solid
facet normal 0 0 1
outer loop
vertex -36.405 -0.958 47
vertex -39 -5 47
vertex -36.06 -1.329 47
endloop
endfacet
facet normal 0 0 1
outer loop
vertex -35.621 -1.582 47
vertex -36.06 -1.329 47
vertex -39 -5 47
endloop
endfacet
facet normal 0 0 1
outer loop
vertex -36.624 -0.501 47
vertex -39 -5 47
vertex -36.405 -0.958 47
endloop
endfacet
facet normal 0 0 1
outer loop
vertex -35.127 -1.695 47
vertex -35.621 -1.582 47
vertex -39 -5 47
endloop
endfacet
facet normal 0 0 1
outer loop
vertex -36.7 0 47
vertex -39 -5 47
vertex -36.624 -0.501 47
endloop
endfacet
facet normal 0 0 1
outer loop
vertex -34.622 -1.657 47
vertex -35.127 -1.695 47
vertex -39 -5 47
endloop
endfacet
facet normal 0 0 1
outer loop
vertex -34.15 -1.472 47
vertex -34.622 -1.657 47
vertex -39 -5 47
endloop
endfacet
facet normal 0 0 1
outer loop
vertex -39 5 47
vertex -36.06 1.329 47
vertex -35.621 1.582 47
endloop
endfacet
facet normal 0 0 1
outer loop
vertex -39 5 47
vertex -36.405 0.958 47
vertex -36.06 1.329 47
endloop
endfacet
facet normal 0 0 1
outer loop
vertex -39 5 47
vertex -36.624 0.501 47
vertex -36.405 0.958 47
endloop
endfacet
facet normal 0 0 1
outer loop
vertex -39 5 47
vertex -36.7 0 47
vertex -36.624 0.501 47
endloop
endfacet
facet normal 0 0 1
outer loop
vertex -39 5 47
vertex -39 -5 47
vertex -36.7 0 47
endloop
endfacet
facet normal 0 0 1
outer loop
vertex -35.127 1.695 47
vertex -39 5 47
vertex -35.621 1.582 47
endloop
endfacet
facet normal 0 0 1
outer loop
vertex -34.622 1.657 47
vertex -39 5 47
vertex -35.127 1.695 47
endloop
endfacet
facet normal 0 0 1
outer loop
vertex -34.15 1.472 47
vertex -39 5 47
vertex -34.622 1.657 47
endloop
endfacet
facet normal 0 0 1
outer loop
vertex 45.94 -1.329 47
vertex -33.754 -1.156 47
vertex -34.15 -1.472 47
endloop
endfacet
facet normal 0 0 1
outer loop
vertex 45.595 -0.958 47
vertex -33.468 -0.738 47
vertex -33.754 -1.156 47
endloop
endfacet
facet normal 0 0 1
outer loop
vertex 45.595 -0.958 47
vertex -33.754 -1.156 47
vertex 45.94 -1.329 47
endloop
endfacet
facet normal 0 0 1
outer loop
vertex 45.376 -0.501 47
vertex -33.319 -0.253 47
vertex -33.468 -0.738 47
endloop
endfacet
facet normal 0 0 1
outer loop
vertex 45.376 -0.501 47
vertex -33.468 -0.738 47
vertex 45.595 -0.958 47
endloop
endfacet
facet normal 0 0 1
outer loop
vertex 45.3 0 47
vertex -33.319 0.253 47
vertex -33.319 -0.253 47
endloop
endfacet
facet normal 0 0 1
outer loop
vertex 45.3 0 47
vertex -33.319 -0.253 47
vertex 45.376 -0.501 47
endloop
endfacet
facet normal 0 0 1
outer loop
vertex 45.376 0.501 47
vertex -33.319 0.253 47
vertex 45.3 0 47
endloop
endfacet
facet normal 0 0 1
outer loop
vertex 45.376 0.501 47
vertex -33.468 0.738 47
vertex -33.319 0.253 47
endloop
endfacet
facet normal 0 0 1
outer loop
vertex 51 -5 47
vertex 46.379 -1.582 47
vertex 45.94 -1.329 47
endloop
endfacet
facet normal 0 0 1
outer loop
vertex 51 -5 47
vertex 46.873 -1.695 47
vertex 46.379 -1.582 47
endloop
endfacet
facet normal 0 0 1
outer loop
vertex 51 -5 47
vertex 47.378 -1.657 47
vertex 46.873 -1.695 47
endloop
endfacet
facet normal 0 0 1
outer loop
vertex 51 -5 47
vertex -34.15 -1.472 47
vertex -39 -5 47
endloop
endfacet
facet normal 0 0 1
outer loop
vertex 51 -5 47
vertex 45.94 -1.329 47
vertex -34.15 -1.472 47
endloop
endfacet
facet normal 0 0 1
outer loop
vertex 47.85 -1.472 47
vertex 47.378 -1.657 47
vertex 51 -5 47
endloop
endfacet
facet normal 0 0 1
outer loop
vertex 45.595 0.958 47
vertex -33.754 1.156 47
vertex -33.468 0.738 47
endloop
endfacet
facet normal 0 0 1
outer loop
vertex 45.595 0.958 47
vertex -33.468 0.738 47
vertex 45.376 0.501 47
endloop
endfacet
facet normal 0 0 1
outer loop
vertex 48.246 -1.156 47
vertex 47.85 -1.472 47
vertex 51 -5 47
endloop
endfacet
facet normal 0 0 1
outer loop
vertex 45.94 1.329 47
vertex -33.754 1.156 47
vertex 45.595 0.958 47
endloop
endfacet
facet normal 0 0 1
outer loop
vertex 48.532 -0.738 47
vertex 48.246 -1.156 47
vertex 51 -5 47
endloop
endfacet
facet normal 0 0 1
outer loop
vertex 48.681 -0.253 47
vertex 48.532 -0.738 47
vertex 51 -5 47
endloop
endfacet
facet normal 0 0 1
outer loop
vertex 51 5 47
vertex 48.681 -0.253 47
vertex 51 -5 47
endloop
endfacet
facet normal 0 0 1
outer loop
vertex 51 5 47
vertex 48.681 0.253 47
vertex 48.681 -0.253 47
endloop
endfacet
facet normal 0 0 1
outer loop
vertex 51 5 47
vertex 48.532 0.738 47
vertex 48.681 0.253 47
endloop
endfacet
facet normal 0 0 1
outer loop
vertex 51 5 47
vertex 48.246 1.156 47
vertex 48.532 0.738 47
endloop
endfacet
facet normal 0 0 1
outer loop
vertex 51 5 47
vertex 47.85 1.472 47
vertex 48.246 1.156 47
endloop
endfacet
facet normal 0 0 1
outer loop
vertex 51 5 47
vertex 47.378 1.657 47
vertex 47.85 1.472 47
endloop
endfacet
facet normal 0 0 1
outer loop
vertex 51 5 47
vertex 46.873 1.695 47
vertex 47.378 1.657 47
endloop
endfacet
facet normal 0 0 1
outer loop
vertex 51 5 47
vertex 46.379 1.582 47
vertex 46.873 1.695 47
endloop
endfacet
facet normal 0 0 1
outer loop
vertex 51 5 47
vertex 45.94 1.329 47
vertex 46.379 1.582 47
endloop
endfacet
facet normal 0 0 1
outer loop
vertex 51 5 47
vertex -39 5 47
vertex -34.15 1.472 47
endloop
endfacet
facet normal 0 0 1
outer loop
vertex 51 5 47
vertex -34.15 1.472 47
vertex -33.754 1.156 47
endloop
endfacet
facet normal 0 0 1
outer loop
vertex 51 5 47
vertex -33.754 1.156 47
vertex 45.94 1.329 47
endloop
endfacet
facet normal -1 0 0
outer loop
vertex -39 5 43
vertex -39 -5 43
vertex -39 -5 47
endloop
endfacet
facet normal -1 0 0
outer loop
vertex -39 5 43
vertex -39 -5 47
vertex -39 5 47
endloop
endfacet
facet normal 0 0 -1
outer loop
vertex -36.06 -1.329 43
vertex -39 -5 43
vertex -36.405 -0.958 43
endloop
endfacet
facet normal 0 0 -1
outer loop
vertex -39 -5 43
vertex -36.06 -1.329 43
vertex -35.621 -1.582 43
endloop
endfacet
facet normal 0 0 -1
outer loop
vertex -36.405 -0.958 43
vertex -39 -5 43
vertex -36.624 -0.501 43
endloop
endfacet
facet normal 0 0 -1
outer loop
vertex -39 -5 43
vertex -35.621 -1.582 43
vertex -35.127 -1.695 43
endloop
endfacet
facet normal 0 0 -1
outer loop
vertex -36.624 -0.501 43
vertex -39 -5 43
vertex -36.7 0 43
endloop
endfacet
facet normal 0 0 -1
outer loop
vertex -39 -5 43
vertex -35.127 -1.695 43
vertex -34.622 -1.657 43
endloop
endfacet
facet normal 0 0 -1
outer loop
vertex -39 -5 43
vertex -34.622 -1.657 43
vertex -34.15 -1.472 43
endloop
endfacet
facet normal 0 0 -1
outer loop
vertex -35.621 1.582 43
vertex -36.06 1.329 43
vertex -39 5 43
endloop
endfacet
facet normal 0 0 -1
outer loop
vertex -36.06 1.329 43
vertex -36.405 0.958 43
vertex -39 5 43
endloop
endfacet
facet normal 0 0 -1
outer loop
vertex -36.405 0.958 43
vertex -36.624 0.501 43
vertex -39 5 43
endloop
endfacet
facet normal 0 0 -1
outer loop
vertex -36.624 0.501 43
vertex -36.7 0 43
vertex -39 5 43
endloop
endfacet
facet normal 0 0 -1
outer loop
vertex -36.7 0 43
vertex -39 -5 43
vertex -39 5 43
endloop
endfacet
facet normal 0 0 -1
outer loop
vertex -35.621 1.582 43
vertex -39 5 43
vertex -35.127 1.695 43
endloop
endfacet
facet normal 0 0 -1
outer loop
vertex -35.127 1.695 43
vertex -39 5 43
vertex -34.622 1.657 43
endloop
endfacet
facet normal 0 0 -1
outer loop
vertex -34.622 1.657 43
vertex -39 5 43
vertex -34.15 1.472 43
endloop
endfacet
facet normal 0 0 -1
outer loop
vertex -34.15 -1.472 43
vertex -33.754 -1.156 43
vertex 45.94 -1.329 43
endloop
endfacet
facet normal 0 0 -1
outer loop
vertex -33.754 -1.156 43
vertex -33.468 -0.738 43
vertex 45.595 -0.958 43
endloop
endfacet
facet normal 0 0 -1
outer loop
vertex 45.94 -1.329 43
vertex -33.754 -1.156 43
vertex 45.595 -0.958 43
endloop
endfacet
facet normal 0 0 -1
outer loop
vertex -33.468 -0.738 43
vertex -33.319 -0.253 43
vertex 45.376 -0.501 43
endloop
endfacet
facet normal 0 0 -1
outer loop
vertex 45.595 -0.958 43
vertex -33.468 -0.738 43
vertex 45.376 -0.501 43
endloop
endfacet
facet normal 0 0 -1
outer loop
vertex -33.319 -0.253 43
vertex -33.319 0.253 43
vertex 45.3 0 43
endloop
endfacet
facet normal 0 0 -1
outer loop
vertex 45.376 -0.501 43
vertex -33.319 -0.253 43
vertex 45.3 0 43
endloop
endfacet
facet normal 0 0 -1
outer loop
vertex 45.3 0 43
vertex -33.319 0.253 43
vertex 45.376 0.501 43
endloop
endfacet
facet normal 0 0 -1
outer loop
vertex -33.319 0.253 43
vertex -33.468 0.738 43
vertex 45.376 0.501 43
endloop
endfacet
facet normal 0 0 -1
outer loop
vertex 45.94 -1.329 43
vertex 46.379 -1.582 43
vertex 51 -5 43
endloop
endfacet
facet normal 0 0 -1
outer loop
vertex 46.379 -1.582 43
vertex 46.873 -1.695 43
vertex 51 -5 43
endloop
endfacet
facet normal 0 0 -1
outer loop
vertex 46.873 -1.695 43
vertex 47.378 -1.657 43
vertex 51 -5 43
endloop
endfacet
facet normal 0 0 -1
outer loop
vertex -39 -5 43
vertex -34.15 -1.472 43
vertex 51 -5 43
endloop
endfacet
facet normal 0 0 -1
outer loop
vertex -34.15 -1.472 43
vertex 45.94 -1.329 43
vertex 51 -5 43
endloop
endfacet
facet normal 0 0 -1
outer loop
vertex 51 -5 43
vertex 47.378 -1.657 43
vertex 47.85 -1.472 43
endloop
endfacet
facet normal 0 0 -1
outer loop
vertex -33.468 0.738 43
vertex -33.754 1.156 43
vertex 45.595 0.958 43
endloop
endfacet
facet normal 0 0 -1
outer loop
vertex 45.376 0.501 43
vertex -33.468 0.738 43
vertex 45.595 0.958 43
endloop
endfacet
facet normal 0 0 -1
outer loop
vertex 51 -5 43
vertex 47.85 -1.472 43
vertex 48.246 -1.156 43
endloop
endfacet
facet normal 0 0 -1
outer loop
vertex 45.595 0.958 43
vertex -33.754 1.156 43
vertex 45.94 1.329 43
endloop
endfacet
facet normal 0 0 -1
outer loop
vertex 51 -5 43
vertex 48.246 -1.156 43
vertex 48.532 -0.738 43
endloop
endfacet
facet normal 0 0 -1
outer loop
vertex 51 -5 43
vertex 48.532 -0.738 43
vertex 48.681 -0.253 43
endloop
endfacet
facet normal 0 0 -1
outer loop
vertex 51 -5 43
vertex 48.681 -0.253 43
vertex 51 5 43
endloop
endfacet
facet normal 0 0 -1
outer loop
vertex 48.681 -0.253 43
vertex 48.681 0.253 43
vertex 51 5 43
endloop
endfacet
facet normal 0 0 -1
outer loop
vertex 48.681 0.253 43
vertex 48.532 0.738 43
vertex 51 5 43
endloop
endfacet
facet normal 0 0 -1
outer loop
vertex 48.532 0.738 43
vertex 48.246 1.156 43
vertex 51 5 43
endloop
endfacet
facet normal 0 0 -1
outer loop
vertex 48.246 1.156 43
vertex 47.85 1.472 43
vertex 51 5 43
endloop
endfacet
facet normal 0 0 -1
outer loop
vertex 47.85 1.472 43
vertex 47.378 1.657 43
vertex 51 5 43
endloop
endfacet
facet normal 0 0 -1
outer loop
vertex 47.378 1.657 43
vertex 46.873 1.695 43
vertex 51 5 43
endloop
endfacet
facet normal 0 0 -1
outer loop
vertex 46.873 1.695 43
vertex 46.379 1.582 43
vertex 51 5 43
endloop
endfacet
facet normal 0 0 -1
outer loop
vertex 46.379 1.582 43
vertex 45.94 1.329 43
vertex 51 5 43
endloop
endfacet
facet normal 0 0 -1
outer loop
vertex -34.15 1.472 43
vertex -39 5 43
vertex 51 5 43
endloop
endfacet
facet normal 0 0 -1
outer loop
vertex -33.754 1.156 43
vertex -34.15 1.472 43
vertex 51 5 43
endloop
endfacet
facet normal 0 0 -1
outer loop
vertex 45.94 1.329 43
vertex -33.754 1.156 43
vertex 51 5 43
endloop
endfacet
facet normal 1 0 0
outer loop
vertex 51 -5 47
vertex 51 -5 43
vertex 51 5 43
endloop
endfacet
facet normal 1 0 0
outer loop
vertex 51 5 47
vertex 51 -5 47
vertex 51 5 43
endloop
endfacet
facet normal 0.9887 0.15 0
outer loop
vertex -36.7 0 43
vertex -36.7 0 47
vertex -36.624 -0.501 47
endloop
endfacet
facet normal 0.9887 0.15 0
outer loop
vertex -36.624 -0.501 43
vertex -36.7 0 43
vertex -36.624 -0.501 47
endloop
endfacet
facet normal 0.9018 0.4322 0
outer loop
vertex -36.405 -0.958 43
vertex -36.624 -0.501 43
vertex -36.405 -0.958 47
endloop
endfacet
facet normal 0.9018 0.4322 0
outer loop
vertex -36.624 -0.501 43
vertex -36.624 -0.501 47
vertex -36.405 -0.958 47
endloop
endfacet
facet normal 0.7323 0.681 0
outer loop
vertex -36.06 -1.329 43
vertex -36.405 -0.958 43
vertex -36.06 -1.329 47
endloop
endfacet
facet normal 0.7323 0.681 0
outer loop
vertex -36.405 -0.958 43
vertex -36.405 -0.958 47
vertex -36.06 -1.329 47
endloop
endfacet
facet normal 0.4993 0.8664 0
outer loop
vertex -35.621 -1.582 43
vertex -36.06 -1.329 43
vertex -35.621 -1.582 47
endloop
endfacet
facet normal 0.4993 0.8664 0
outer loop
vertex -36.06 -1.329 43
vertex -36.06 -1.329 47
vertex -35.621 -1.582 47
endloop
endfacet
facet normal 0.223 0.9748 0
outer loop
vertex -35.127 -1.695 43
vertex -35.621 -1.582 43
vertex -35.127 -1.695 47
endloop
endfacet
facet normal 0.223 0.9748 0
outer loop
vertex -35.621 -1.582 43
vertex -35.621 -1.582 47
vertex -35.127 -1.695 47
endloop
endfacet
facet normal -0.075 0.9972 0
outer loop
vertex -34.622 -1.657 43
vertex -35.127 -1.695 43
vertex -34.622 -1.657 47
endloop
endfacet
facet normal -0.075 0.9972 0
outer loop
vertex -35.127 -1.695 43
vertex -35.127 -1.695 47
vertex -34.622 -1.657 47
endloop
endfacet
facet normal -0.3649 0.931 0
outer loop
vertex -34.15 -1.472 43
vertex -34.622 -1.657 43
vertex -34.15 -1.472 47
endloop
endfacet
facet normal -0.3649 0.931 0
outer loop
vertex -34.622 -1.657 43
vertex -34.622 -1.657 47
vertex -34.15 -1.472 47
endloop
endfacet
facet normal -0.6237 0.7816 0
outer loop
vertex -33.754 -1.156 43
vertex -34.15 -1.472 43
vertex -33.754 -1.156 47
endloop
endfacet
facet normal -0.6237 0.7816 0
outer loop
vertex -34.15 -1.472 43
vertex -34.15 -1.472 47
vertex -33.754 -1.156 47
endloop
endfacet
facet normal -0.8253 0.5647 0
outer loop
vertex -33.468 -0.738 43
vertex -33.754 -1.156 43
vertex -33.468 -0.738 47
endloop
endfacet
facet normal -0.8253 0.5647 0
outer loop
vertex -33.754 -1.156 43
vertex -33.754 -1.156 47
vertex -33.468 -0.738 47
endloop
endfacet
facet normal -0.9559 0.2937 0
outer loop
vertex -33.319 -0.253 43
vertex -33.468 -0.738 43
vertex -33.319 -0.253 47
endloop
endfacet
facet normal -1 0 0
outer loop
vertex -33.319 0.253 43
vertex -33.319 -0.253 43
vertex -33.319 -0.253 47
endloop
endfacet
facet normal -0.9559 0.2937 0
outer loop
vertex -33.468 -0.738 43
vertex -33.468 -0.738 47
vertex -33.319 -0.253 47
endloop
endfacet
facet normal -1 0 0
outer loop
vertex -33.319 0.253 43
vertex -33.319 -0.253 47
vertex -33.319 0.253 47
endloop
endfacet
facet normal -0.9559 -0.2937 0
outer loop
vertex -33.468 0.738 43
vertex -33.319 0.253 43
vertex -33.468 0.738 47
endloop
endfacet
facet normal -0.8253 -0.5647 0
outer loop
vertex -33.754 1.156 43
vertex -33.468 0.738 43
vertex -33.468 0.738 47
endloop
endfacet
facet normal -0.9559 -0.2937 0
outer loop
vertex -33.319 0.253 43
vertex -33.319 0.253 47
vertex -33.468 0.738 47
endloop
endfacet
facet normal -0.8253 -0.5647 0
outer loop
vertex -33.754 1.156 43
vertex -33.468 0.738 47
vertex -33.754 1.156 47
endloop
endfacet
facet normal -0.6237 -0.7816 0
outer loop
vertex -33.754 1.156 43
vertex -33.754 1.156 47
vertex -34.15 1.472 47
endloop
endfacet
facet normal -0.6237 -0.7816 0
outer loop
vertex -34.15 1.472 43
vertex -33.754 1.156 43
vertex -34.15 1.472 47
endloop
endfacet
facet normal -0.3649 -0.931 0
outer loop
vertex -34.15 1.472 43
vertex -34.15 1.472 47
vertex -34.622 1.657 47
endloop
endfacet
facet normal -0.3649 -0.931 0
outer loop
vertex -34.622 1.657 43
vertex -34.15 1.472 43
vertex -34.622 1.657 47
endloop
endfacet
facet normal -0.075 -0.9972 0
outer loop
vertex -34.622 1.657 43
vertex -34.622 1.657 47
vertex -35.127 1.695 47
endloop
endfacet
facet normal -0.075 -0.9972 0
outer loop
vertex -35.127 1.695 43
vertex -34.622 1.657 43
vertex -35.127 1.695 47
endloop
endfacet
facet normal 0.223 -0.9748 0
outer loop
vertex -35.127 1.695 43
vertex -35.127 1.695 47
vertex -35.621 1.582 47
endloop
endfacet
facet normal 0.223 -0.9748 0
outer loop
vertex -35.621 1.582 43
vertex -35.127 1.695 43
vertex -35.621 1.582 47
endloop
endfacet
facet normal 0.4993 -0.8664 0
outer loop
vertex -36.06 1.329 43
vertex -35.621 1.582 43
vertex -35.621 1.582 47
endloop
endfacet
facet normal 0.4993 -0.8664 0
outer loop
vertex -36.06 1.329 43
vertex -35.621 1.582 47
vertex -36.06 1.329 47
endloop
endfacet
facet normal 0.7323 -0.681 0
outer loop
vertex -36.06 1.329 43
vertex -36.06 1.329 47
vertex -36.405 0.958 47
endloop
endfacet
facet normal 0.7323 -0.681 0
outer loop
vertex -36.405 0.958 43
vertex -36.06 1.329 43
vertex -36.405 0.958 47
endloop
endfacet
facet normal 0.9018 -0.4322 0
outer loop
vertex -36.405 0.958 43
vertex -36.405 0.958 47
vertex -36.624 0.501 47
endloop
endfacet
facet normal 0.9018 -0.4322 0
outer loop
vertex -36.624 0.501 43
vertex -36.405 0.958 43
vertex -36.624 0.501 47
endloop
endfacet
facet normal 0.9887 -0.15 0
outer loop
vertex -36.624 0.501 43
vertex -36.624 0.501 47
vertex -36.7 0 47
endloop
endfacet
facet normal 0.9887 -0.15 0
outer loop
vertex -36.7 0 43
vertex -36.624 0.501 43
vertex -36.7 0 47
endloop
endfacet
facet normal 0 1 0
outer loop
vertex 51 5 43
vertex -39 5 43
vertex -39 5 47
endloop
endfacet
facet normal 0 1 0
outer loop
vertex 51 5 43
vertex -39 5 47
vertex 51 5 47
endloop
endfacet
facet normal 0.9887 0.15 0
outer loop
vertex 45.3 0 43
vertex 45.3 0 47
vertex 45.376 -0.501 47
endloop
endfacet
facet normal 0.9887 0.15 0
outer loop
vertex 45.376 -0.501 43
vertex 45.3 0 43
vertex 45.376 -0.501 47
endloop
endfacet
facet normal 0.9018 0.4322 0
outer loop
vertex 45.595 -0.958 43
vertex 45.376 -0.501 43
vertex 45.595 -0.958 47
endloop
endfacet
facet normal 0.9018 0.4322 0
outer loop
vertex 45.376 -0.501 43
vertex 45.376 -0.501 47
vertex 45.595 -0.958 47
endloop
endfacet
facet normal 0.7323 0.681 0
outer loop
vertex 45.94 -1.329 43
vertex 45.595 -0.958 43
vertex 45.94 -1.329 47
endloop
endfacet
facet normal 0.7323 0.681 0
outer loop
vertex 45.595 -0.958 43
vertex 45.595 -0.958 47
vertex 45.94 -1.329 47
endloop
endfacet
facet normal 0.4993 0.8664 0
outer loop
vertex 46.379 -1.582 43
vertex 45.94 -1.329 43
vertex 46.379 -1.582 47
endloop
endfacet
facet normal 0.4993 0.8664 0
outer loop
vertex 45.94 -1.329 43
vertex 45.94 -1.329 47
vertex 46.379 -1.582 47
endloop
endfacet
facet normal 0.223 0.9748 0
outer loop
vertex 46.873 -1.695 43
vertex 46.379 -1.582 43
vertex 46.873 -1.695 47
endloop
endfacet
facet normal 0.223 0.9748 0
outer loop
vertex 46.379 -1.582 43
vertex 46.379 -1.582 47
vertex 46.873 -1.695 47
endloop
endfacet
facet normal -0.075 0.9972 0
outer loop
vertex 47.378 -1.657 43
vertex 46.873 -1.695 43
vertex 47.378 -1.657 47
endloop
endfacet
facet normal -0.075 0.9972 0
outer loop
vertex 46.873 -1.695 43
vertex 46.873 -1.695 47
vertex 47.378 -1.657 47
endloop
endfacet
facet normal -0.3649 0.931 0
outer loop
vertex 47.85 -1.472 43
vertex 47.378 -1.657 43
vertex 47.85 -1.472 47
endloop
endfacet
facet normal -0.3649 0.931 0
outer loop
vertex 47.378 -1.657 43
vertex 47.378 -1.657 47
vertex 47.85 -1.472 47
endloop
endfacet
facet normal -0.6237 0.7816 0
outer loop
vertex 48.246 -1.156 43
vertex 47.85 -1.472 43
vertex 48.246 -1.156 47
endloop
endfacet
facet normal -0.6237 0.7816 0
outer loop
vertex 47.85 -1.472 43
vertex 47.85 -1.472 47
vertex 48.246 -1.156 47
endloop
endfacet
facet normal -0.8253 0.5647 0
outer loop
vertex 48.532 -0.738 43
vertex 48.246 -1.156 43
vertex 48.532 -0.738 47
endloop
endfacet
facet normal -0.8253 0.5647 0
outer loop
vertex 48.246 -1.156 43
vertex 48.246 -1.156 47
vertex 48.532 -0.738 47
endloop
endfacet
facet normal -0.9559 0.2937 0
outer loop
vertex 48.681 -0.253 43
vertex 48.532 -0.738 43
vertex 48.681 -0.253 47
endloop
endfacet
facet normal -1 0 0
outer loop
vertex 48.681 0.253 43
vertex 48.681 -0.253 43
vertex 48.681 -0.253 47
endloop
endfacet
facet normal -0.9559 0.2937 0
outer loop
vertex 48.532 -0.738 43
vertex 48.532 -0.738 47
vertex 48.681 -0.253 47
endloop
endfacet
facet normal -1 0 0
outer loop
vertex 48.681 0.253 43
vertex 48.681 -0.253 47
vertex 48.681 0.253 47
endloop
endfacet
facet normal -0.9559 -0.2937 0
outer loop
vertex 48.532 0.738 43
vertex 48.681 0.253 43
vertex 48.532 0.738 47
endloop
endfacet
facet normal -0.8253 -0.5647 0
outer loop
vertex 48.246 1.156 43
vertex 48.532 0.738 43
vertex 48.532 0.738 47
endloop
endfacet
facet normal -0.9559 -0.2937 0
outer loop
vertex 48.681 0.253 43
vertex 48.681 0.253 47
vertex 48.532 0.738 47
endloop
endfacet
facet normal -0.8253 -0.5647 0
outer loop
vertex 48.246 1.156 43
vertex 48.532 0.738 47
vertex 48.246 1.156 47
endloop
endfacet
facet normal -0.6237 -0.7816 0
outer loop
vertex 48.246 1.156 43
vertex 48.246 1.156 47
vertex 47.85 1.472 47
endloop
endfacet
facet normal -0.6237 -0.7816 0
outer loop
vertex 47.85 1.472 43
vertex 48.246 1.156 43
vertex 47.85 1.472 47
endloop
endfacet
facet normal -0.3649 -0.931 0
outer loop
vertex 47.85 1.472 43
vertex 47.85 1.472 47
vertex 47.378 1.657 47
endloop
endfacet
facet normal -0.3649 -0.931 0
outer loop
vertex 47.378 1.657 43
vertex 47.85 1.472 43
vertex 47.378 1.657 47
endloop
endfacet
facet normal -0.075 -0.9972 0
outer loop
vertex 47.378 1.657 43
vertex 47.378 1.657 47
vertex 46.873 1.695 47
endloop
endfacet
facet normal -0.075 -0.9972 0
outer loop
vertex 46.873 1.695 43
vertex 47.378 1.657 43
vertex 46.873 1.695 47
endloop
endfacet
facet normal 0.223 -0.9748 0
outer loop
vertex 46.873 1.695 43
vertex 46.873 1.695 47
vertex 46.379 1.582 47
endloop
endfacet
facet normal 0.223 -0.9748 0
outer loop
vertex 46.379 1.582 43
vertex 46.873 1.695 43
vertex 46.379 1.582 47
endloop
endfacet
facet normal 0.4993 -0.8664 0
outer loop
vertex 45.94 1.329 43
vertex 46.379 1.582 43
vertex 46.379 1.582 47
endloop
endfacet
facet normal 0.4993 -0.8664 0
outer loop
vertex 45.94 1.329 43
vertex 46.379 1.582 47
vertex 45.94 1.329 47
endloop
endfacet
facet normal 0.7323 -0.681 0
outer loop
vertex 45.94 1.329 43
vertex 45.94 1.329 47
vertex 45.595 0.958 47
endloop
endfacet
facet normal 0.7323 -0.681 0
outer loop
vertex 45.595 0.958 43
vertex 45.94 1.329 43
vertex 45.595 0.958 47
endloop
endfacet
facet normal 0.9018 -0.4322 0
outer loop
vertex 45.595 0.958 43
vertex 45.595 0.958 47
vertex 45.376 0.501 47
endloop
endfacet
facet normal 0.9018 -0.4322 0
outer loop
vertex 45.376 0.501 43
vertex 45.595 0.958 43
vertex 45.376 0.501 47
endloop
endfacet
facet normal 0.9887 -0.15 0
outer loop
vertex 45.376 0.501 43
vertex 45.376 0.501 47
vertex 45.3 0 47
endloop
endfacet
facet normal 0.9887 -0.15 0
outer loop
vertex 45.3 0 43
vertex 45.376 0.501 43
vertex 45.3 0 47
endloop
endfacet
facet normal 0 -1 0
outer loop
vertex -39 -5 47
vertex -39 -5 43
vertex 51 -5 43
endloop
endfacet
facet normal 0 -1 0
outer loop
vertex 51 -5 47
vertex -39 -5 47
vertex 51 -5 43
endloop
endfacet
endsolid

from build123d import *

# Parameters (mm, degrees)
BATTERY_REMOVABLE_CLAMP_BAR_START = 43
SKETCH_1_W                        = 90
SKETCH_1_H                        = 10
BATTERY_REMOVABLE_CLAMP_BAR_DEPTH = 4
CLAMP_TWO_M3_START                = 48
SKETCH_2_R                        = 1.7
CLAMP_TWO_M3_DEPTH                = 6


with BuildPart() as part:
    # 草图1 → Battery_removable_clamp_bar (new body)
    with BuildSketch(Plane.XY.offset(BATTERY_REMOVABLE_CLAMP_BAR_START)):
        with Locations((6, 0)):
            Rectangle(SKETCH_1_W, SKETCH_1_H)
    extrude(amount=BATTERY_REMOVABLE_CLAMP_BAR_DEPTH)

    # 草图2 → Clamp_two_M3 (cut)
    with BuildSketch(Plane.XY.offset(CLAMP_TWO_M3_START)):
        with Locations(Location((-35, 0, 0), (0, 0, 180))):
            Circle(SKETCH_2_R)
        with Locations(Location((47, 0, 0), (0, 0, 180))):
            Circle(SKETCH_2_R)
    extrude(amount=-CLAMP_TWO_M3_DEPTH, mode=Mode.SUBTRACT)


solid = part.part
